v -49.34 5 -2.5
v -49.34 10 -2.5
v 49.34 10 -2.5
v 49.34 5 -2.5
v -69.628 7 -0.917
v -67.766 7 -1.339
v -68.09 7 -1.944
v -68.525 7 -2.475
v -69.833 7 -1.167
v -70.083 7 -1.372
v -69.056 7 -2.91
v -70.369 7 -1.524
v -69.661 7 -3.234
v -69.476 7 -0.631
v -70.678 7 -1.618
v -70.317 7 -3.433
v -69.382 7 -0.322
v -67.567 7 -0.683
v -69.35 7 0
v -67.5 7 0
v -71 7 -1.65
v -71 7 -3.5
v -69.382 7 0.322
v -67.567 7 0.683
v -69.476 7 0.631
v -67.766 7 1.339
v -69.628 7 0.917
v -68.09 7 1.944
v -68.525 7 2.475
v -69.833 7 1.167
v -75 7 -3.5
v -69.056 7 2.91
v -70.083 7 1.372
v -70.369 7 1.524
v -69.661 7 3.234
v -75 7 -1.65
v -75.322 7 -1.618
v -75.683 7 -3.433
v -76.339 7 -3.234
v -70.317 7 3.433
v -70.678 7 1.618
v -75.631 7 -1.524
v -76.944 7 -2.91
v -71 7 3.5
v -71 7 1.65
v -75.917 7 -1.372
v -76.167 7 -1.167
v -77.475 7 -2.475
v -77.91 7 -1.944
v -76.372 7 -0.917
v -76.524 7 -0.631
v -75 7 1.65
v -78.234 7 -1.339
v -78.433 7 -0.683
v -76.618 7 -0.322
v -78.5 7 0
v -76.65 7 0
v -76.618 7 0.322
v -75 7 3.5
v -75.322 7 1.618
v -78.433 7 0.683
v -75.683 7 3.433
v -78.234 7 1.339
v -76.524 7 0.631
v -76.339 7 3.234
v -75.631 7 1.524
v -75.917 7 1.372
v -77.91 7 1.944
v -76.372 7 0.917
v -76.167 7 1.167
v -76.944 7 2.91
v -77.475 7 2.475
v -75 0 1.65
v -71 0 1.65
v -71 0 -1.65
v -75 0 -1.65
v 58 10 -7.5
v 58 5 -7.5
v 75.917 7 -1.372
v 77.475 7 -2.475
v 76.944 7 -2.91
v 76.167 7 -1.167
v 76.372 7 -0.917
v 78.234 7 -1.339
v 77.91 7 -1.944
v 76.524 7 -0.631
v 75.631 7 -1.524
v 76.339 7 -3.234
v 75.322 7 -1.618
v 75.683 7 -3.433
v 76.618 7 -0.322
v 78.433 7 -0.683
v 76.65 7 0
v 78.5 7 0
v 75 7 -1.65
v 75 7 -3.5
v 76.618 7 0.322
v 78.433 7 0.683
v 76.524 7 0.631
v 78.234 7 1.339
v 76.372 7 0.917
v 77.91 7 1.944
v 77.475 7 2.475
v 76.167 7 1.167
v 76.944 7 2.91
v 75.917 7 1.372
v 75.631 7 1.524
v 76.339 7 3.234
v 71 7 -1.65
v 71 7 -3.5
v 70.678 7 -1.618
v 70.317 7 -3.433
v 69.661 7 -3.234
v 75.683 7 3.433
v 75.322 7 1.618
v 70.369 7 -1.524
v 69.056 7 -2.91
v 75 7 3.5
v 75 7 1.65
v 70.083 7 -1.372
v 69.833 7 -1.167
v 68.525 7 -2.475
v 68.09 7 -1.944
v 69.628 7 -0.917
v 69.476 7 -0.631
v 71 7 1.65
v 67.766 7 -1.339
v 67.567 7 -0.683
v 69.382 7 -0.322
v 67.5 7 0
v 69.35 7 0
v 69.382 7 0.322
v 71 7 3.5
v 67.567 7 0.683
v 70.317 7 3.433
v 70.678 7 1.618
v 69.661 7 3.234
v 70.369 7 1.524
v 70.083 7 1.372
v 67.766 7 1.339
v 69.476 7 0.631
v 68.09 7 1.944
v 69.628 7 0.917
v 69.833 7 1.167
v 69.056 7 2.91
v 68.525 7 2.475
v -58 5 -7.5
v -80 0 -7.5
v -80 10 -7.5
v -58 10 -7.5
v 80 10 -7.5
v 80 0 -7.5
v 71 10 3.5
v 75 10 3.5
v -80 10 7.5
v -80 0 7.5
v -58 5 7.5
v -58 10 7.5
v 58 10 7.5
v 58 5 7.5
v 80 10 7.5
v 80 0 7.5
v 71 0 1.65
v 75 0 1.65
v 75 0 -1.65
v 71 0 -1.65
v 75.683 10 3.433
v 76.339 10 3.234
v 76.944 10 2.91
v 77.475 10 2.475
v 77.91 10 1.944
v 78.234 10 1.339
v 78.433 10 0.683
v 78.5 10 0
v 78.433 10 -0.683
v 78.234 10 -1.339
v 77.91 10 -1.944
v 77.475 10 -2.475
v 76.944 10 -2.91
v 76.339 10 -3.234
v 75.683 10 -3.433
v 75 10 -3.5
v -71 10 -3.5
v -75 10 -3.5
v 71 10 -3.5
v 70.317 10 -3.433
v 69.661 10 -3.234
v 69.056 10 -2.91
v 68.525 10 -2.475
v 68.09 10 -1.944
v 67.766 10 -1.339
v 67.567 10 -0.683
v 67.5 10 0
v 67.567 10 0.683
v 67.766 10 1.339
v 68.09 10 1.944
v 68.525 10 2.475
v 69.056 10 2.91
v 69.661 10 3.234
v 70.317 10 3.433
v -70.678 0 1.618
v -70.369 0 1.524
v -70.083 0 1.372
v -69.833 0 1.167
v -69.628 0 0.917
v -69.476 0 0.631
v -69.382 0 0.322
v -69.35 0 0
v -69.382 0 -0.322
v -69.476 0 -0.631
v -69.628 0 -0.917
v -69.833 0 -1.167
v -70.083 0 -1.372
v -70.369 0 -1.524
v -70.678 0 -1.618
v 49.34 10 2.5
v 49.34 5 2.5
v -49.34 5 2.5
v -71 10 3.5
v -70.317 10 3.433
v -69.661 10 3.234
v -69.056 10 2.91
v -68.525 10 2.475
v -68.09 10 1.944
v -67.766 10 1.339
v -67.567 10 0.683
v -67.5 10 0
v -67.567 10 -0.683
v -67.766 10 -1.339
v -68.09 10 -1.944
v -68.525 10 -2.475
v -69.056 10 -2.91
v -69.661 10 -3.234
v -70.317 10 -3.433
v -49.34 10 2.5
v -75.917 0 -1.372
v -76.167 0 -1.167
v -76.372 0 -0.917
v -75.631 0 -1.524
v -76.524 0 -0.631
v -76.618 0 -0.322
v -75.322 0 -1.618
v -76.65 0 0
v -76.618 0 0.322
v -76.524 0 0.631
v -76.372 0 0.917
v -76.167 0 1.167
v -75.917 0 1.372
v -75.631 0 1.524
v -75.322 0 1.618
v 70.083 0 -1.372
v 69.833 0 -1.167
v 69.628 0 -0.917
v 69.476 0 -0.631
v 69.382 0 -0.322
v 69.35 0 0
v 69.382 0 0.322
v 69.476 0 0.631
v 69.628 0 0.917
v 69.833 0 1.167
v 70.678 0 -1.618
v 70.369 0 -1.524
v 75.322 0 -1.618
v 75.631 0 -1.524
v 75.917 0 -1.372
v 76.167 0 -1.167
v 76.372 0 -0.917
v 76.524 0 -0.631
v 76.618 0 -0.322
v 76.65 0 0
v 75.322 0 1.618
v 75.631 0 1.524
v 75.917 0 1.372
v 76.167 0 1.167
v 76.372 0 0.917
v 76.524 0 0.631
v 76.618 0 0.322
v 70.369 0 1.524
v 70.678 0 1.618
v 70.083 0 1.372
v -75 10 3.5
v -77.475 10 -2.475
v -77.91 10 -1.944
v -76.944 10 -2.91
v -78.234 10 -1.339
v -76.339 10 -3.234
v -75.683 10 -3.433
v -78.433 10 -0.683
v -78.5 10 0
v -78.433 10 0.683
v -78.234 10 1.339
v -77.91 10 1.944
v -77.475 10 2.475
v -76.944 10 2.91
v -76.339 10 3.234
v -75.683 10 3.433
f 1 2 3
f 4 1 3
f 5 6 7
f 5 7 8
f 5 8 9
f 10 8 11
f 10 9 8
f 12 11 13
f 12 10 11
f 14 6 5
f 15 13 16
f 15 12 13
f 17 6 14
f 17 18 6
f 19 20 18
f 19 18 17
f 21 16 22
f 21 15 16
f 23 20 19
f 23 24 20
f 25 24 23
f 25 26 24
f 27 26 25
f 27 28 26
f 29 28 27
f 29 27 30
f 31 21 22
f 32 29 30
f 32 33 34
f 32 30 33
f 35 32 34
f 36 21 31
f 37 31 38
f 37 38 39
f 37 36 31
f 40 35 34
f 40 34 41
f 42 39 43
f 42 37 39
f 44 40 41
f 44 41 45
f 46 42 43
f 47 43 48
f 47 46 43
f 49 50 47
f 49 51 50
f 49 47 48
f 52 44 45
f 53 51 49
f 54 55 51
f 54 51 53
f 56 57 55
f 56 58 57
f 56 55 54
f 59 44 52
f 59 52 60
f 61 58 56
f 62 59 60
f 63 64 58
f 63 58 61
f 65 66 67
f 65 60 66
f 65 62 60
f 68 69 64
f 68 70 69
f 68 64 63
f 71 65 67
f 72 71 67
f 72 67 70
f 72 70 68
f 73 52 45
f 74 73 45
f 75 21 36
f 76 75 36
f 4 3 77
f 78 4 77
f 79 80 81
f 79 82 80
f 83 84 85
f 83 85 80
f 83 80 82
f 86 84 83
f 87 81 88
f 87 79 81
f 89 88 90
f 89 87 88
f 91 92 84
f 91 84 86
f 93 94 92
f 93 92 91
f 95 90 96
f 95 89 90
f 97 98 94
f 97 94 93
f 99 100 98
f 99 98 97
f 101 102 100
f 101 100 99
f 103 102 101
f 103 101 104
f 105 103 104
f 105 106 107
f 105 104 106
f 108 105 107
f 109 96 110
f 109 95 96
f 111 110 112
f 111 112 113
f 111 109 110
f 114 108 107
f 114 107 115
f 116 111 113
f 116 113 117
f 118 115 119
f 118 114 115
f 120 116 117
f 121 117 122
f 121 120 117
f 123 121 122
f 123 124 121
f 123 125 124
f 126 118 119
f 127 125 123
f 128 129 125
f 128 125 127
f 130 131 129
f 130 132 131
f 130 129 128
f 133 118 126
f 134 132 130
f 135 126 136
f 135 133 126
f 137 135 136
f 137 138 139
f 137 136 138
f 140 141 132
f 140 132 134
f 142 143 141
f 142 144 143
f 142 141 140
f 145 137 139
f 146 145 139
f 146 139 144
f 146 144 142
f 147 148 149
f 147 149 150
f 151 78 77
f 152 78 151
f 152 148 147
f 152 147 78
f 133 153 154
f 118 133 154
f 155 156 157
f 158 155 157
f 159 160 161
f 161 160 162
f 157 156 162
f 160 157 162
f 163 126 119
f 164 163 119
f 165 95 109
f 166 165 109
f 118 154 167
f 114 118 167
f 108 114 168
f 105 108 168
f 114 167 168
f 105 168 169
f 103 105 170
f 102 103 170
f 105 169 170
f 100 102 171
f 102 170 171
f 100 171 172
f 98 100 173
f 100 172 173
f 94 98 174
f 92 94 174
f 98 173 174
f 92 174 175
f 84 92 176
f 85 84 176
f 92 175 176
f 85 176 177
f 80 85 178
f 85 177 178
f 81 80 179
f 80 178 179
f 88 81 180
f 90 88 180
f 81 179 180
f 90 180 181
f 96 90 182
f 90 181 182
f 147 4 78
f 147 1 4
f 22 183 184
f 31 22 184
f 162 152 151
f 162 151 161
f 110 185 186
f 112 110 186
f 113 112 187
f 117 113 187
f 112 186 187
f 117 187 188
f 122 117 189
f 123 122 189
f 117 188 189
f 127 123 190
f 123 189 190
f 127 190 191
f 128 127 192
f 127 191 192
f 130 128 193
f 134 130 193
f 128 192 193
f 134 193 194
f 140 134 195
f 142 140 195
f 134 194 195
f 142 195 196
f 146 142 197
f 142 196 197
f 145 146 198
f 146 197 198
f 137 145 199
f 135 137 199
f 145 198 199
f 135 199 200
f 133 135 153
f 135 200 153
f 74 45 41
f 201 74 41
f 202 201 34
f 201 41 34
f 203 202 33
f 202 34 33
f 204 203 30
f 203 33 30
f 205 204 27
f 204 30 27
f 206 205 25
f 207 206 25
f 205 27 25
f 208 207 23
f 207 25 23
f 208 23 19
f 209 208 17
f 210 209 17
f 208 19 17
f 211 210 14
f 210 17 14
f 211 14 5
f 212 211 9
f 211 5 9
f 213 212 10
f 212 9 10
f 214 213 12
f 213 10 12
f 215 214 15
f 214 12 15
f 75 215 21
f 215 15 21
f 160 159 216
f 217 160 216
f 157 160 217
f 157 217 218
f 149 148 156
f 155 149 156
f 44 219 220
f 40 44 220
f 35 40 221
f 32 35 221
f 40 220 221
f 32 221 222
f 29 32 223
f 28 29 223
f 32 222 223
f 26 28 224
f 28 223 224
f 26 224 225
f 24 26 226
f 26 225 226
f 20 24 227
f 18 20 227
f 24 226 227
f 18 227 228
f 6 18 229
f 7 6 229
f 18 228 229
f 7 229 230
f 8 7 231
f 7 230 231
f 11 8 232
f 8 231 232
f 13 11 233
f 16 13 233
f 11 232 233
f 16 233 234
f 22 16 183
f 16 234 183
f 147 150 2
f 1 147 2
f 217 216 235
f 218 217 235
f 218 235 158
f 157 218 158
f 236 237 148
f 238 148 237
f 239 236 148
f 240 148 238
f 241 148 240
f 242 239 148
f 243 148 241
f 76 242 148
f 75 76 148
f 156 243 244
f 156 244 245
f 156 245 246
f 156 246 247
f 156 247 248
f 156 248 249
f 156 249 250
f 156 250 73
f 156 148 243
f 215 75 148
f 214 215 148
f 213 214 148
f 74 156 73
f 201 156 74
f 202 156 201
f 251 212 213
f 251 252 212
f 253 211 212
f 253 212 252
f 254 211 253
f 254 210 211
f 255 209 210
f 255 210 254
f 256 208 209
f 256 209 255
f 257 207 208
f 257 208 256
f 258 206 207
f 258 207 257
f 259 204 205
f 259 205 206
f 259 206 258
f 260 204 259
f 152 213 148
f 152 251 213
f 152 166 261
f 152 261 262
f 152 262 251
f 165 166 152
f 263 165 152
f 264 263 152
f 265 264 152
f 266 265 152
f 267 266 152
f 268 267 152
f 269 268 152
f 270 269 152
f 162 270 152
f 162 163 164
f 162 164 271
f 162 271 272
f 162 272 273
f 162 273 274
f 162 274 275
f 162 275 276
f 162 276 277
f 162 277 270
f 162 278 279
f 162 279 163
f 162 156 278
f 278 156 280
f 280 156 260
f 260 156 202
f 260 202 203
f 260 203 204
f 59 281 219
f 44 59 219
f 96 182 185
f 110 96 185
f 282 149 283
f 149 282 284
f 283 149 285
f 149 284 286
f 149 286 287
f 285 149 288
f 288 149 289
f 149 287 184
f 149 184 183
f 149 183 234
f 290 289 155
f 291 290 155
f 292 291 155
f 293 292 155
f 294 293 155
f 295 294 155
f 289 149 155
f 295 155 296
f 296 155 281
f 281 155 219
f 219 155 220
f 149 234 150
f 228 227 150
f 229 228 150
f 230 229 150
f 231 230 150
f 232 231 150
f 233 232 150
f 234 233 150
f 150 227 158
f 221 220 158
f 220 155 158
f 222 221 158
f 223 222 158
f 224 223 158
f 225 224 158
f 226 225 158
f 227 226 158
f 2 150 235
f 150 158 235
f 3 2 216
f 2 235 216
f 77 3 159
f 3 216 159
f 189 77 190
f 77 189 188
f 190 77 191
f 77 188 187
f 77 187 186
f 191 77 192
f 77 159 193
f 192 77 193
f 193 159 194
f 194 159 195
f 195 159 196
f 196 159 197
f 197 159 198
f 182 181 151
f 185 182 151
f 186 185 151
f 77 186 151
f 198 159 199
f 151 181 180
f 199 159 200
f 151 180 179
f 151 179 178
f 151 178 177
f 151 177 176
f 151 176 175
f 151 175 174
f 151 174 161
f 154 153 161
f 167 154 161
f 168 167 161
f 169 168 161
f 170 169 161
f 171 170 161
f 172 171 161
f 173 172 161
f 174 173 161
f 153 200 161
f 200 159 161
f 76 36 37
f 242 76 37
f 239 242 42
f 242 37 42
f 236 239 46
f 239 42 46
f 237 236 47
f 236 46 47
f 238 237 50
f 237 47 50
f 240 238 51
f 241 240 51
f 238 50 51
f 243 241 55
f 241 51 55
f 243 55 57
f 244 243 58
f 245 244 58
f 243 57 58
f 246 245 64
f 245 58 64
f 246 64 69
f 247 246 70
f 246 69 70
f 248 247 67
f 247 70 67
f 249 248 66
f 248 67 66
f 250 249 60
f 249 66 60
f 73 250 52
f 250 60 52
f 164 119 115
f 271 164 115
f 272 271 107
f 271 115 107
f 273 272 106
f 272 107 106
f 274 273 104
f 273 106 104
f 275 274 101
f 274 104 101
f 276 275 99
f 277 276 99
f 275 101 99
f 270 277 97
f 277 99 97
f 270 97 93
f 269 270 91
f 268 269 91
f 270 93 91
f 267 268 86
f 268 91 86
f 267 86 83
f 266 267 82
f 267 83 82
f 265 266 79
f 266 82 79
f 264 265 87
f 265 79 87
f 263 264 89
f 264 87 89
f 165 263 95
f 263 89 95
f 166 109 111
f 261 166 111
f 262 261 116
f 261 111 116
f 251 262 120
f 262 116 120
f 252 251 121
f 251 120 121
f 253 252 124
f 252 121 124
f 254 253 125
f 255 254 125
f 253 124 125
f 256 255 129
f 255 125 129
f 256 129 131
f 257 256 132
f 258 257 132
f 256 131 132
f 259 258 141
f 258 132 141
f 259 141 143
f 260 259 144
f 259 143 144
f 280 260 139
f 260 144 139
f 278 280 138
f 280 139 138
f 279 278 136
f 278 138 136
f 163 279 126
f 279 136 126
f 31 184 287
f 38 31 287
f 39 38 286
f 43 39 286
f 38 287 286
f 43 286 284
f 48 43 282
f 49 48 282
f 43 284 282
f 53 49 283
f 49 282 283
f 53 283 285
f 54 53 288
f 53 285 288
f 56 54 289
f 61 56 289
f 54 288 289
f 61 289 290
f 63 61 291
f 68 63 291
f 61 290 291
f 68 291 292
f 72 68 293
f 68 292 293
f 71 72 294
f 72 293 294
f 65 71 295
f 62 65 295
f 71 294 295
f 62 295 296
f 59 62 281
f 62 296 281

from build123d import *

# Parameters (mm, degrees)
F0_W     = 160
F0_H     = 15
F1_DEPTH = 10
F3_DEPTH = 5
F6_DEPTH = 3
F7_DEPTH = 10.001


with BuildPart() as f1:
    # F0 (on Front) → F1 (new body)
    with BuildSketch(Plane.XZ):
        Rectangle(F0_W, F0_H)
    extrude(amount=-F1_DEPTH)

    # F2 (on face) → F3 (cut)
    with BuildSketch(Plane(origin=(0, 10, 0), x_dir=(-1, 0, 0), z_dir=(0, 1, 0))):
        Polygon((58, 7.5), (-58, 7.5), (-49.339746, 2.5), (49.339746, 2.5), align=None)
        Polygon((-49.339746, -2.5), (-58, -7.5), (58, -7.5), (49.339746, -2.5), align=None)
    extrude(amount=-F3_DEPTH, mode=Mode.SUBTRACT)

    # F5 (on face) → F6 (cut)
    with BuildSketch(Plane(origin=(0, 10, 0), x_dir=(-1, 0, 0), z_dir=(0, 1, 0))):
        with BuildLine():
            ThreePointArc((-75, 3.5), (-78.5, 0), (-75, -3.5))
            Line((-75, -3.5), (-71, -3.5))
            ThreePointArc((-71, -3.5), (-67.5, 0), (-71, 3.5))
            Line((-71, 3.5), (-75, 3.5))
        make_face()
        with BuildLine():
            ThreePointArc((75, -3.5), (78.5, 0), (75, 3.5))
            Line((75, 3.5), (71, 3.5))
            ThreePointArc((71, 3.5), (67.5, 0), (71, -3.5))
            Line((71, -3.5), (75, -3.5))
        make_face()
    extrude(amount=-F6_DEPTH, mode=Mode.SUBTRACT)

    # F4 (on face) → F7 (cut, through all)
    with BuildSketch(Plane(origin=(0, 10, 0), x_dir=(-1, 0, 0), z_dir=(0, 1, 0))):
        with BuildLine():
            ThreePointArc((-75, 1.65), (-76.65, 0), (-75, -1.65))
            Line((-75, -1.65), (-71, -1.65))
            ThreePointArc((-71, -1.65), (-69.35, 0), (-71, 1.65))
            Line((-71, 1.65), (-75, 1.65))
        make_face()
        with BuildLine():
            ThreePointArc((75, -1.65), (76.65, 0), (75, 1.65))
            Line((75, 1.65), (71, 1.65))
            ThreePointArc((71, 1.65), (69.35, 0), (71, -1.65))
            Line((71, -1.65), (75, -1.65))
        make_face()
    extrude(amount=-F7_DEPTH, mode=Mode.SUBTRACT)


solid = f1.part
